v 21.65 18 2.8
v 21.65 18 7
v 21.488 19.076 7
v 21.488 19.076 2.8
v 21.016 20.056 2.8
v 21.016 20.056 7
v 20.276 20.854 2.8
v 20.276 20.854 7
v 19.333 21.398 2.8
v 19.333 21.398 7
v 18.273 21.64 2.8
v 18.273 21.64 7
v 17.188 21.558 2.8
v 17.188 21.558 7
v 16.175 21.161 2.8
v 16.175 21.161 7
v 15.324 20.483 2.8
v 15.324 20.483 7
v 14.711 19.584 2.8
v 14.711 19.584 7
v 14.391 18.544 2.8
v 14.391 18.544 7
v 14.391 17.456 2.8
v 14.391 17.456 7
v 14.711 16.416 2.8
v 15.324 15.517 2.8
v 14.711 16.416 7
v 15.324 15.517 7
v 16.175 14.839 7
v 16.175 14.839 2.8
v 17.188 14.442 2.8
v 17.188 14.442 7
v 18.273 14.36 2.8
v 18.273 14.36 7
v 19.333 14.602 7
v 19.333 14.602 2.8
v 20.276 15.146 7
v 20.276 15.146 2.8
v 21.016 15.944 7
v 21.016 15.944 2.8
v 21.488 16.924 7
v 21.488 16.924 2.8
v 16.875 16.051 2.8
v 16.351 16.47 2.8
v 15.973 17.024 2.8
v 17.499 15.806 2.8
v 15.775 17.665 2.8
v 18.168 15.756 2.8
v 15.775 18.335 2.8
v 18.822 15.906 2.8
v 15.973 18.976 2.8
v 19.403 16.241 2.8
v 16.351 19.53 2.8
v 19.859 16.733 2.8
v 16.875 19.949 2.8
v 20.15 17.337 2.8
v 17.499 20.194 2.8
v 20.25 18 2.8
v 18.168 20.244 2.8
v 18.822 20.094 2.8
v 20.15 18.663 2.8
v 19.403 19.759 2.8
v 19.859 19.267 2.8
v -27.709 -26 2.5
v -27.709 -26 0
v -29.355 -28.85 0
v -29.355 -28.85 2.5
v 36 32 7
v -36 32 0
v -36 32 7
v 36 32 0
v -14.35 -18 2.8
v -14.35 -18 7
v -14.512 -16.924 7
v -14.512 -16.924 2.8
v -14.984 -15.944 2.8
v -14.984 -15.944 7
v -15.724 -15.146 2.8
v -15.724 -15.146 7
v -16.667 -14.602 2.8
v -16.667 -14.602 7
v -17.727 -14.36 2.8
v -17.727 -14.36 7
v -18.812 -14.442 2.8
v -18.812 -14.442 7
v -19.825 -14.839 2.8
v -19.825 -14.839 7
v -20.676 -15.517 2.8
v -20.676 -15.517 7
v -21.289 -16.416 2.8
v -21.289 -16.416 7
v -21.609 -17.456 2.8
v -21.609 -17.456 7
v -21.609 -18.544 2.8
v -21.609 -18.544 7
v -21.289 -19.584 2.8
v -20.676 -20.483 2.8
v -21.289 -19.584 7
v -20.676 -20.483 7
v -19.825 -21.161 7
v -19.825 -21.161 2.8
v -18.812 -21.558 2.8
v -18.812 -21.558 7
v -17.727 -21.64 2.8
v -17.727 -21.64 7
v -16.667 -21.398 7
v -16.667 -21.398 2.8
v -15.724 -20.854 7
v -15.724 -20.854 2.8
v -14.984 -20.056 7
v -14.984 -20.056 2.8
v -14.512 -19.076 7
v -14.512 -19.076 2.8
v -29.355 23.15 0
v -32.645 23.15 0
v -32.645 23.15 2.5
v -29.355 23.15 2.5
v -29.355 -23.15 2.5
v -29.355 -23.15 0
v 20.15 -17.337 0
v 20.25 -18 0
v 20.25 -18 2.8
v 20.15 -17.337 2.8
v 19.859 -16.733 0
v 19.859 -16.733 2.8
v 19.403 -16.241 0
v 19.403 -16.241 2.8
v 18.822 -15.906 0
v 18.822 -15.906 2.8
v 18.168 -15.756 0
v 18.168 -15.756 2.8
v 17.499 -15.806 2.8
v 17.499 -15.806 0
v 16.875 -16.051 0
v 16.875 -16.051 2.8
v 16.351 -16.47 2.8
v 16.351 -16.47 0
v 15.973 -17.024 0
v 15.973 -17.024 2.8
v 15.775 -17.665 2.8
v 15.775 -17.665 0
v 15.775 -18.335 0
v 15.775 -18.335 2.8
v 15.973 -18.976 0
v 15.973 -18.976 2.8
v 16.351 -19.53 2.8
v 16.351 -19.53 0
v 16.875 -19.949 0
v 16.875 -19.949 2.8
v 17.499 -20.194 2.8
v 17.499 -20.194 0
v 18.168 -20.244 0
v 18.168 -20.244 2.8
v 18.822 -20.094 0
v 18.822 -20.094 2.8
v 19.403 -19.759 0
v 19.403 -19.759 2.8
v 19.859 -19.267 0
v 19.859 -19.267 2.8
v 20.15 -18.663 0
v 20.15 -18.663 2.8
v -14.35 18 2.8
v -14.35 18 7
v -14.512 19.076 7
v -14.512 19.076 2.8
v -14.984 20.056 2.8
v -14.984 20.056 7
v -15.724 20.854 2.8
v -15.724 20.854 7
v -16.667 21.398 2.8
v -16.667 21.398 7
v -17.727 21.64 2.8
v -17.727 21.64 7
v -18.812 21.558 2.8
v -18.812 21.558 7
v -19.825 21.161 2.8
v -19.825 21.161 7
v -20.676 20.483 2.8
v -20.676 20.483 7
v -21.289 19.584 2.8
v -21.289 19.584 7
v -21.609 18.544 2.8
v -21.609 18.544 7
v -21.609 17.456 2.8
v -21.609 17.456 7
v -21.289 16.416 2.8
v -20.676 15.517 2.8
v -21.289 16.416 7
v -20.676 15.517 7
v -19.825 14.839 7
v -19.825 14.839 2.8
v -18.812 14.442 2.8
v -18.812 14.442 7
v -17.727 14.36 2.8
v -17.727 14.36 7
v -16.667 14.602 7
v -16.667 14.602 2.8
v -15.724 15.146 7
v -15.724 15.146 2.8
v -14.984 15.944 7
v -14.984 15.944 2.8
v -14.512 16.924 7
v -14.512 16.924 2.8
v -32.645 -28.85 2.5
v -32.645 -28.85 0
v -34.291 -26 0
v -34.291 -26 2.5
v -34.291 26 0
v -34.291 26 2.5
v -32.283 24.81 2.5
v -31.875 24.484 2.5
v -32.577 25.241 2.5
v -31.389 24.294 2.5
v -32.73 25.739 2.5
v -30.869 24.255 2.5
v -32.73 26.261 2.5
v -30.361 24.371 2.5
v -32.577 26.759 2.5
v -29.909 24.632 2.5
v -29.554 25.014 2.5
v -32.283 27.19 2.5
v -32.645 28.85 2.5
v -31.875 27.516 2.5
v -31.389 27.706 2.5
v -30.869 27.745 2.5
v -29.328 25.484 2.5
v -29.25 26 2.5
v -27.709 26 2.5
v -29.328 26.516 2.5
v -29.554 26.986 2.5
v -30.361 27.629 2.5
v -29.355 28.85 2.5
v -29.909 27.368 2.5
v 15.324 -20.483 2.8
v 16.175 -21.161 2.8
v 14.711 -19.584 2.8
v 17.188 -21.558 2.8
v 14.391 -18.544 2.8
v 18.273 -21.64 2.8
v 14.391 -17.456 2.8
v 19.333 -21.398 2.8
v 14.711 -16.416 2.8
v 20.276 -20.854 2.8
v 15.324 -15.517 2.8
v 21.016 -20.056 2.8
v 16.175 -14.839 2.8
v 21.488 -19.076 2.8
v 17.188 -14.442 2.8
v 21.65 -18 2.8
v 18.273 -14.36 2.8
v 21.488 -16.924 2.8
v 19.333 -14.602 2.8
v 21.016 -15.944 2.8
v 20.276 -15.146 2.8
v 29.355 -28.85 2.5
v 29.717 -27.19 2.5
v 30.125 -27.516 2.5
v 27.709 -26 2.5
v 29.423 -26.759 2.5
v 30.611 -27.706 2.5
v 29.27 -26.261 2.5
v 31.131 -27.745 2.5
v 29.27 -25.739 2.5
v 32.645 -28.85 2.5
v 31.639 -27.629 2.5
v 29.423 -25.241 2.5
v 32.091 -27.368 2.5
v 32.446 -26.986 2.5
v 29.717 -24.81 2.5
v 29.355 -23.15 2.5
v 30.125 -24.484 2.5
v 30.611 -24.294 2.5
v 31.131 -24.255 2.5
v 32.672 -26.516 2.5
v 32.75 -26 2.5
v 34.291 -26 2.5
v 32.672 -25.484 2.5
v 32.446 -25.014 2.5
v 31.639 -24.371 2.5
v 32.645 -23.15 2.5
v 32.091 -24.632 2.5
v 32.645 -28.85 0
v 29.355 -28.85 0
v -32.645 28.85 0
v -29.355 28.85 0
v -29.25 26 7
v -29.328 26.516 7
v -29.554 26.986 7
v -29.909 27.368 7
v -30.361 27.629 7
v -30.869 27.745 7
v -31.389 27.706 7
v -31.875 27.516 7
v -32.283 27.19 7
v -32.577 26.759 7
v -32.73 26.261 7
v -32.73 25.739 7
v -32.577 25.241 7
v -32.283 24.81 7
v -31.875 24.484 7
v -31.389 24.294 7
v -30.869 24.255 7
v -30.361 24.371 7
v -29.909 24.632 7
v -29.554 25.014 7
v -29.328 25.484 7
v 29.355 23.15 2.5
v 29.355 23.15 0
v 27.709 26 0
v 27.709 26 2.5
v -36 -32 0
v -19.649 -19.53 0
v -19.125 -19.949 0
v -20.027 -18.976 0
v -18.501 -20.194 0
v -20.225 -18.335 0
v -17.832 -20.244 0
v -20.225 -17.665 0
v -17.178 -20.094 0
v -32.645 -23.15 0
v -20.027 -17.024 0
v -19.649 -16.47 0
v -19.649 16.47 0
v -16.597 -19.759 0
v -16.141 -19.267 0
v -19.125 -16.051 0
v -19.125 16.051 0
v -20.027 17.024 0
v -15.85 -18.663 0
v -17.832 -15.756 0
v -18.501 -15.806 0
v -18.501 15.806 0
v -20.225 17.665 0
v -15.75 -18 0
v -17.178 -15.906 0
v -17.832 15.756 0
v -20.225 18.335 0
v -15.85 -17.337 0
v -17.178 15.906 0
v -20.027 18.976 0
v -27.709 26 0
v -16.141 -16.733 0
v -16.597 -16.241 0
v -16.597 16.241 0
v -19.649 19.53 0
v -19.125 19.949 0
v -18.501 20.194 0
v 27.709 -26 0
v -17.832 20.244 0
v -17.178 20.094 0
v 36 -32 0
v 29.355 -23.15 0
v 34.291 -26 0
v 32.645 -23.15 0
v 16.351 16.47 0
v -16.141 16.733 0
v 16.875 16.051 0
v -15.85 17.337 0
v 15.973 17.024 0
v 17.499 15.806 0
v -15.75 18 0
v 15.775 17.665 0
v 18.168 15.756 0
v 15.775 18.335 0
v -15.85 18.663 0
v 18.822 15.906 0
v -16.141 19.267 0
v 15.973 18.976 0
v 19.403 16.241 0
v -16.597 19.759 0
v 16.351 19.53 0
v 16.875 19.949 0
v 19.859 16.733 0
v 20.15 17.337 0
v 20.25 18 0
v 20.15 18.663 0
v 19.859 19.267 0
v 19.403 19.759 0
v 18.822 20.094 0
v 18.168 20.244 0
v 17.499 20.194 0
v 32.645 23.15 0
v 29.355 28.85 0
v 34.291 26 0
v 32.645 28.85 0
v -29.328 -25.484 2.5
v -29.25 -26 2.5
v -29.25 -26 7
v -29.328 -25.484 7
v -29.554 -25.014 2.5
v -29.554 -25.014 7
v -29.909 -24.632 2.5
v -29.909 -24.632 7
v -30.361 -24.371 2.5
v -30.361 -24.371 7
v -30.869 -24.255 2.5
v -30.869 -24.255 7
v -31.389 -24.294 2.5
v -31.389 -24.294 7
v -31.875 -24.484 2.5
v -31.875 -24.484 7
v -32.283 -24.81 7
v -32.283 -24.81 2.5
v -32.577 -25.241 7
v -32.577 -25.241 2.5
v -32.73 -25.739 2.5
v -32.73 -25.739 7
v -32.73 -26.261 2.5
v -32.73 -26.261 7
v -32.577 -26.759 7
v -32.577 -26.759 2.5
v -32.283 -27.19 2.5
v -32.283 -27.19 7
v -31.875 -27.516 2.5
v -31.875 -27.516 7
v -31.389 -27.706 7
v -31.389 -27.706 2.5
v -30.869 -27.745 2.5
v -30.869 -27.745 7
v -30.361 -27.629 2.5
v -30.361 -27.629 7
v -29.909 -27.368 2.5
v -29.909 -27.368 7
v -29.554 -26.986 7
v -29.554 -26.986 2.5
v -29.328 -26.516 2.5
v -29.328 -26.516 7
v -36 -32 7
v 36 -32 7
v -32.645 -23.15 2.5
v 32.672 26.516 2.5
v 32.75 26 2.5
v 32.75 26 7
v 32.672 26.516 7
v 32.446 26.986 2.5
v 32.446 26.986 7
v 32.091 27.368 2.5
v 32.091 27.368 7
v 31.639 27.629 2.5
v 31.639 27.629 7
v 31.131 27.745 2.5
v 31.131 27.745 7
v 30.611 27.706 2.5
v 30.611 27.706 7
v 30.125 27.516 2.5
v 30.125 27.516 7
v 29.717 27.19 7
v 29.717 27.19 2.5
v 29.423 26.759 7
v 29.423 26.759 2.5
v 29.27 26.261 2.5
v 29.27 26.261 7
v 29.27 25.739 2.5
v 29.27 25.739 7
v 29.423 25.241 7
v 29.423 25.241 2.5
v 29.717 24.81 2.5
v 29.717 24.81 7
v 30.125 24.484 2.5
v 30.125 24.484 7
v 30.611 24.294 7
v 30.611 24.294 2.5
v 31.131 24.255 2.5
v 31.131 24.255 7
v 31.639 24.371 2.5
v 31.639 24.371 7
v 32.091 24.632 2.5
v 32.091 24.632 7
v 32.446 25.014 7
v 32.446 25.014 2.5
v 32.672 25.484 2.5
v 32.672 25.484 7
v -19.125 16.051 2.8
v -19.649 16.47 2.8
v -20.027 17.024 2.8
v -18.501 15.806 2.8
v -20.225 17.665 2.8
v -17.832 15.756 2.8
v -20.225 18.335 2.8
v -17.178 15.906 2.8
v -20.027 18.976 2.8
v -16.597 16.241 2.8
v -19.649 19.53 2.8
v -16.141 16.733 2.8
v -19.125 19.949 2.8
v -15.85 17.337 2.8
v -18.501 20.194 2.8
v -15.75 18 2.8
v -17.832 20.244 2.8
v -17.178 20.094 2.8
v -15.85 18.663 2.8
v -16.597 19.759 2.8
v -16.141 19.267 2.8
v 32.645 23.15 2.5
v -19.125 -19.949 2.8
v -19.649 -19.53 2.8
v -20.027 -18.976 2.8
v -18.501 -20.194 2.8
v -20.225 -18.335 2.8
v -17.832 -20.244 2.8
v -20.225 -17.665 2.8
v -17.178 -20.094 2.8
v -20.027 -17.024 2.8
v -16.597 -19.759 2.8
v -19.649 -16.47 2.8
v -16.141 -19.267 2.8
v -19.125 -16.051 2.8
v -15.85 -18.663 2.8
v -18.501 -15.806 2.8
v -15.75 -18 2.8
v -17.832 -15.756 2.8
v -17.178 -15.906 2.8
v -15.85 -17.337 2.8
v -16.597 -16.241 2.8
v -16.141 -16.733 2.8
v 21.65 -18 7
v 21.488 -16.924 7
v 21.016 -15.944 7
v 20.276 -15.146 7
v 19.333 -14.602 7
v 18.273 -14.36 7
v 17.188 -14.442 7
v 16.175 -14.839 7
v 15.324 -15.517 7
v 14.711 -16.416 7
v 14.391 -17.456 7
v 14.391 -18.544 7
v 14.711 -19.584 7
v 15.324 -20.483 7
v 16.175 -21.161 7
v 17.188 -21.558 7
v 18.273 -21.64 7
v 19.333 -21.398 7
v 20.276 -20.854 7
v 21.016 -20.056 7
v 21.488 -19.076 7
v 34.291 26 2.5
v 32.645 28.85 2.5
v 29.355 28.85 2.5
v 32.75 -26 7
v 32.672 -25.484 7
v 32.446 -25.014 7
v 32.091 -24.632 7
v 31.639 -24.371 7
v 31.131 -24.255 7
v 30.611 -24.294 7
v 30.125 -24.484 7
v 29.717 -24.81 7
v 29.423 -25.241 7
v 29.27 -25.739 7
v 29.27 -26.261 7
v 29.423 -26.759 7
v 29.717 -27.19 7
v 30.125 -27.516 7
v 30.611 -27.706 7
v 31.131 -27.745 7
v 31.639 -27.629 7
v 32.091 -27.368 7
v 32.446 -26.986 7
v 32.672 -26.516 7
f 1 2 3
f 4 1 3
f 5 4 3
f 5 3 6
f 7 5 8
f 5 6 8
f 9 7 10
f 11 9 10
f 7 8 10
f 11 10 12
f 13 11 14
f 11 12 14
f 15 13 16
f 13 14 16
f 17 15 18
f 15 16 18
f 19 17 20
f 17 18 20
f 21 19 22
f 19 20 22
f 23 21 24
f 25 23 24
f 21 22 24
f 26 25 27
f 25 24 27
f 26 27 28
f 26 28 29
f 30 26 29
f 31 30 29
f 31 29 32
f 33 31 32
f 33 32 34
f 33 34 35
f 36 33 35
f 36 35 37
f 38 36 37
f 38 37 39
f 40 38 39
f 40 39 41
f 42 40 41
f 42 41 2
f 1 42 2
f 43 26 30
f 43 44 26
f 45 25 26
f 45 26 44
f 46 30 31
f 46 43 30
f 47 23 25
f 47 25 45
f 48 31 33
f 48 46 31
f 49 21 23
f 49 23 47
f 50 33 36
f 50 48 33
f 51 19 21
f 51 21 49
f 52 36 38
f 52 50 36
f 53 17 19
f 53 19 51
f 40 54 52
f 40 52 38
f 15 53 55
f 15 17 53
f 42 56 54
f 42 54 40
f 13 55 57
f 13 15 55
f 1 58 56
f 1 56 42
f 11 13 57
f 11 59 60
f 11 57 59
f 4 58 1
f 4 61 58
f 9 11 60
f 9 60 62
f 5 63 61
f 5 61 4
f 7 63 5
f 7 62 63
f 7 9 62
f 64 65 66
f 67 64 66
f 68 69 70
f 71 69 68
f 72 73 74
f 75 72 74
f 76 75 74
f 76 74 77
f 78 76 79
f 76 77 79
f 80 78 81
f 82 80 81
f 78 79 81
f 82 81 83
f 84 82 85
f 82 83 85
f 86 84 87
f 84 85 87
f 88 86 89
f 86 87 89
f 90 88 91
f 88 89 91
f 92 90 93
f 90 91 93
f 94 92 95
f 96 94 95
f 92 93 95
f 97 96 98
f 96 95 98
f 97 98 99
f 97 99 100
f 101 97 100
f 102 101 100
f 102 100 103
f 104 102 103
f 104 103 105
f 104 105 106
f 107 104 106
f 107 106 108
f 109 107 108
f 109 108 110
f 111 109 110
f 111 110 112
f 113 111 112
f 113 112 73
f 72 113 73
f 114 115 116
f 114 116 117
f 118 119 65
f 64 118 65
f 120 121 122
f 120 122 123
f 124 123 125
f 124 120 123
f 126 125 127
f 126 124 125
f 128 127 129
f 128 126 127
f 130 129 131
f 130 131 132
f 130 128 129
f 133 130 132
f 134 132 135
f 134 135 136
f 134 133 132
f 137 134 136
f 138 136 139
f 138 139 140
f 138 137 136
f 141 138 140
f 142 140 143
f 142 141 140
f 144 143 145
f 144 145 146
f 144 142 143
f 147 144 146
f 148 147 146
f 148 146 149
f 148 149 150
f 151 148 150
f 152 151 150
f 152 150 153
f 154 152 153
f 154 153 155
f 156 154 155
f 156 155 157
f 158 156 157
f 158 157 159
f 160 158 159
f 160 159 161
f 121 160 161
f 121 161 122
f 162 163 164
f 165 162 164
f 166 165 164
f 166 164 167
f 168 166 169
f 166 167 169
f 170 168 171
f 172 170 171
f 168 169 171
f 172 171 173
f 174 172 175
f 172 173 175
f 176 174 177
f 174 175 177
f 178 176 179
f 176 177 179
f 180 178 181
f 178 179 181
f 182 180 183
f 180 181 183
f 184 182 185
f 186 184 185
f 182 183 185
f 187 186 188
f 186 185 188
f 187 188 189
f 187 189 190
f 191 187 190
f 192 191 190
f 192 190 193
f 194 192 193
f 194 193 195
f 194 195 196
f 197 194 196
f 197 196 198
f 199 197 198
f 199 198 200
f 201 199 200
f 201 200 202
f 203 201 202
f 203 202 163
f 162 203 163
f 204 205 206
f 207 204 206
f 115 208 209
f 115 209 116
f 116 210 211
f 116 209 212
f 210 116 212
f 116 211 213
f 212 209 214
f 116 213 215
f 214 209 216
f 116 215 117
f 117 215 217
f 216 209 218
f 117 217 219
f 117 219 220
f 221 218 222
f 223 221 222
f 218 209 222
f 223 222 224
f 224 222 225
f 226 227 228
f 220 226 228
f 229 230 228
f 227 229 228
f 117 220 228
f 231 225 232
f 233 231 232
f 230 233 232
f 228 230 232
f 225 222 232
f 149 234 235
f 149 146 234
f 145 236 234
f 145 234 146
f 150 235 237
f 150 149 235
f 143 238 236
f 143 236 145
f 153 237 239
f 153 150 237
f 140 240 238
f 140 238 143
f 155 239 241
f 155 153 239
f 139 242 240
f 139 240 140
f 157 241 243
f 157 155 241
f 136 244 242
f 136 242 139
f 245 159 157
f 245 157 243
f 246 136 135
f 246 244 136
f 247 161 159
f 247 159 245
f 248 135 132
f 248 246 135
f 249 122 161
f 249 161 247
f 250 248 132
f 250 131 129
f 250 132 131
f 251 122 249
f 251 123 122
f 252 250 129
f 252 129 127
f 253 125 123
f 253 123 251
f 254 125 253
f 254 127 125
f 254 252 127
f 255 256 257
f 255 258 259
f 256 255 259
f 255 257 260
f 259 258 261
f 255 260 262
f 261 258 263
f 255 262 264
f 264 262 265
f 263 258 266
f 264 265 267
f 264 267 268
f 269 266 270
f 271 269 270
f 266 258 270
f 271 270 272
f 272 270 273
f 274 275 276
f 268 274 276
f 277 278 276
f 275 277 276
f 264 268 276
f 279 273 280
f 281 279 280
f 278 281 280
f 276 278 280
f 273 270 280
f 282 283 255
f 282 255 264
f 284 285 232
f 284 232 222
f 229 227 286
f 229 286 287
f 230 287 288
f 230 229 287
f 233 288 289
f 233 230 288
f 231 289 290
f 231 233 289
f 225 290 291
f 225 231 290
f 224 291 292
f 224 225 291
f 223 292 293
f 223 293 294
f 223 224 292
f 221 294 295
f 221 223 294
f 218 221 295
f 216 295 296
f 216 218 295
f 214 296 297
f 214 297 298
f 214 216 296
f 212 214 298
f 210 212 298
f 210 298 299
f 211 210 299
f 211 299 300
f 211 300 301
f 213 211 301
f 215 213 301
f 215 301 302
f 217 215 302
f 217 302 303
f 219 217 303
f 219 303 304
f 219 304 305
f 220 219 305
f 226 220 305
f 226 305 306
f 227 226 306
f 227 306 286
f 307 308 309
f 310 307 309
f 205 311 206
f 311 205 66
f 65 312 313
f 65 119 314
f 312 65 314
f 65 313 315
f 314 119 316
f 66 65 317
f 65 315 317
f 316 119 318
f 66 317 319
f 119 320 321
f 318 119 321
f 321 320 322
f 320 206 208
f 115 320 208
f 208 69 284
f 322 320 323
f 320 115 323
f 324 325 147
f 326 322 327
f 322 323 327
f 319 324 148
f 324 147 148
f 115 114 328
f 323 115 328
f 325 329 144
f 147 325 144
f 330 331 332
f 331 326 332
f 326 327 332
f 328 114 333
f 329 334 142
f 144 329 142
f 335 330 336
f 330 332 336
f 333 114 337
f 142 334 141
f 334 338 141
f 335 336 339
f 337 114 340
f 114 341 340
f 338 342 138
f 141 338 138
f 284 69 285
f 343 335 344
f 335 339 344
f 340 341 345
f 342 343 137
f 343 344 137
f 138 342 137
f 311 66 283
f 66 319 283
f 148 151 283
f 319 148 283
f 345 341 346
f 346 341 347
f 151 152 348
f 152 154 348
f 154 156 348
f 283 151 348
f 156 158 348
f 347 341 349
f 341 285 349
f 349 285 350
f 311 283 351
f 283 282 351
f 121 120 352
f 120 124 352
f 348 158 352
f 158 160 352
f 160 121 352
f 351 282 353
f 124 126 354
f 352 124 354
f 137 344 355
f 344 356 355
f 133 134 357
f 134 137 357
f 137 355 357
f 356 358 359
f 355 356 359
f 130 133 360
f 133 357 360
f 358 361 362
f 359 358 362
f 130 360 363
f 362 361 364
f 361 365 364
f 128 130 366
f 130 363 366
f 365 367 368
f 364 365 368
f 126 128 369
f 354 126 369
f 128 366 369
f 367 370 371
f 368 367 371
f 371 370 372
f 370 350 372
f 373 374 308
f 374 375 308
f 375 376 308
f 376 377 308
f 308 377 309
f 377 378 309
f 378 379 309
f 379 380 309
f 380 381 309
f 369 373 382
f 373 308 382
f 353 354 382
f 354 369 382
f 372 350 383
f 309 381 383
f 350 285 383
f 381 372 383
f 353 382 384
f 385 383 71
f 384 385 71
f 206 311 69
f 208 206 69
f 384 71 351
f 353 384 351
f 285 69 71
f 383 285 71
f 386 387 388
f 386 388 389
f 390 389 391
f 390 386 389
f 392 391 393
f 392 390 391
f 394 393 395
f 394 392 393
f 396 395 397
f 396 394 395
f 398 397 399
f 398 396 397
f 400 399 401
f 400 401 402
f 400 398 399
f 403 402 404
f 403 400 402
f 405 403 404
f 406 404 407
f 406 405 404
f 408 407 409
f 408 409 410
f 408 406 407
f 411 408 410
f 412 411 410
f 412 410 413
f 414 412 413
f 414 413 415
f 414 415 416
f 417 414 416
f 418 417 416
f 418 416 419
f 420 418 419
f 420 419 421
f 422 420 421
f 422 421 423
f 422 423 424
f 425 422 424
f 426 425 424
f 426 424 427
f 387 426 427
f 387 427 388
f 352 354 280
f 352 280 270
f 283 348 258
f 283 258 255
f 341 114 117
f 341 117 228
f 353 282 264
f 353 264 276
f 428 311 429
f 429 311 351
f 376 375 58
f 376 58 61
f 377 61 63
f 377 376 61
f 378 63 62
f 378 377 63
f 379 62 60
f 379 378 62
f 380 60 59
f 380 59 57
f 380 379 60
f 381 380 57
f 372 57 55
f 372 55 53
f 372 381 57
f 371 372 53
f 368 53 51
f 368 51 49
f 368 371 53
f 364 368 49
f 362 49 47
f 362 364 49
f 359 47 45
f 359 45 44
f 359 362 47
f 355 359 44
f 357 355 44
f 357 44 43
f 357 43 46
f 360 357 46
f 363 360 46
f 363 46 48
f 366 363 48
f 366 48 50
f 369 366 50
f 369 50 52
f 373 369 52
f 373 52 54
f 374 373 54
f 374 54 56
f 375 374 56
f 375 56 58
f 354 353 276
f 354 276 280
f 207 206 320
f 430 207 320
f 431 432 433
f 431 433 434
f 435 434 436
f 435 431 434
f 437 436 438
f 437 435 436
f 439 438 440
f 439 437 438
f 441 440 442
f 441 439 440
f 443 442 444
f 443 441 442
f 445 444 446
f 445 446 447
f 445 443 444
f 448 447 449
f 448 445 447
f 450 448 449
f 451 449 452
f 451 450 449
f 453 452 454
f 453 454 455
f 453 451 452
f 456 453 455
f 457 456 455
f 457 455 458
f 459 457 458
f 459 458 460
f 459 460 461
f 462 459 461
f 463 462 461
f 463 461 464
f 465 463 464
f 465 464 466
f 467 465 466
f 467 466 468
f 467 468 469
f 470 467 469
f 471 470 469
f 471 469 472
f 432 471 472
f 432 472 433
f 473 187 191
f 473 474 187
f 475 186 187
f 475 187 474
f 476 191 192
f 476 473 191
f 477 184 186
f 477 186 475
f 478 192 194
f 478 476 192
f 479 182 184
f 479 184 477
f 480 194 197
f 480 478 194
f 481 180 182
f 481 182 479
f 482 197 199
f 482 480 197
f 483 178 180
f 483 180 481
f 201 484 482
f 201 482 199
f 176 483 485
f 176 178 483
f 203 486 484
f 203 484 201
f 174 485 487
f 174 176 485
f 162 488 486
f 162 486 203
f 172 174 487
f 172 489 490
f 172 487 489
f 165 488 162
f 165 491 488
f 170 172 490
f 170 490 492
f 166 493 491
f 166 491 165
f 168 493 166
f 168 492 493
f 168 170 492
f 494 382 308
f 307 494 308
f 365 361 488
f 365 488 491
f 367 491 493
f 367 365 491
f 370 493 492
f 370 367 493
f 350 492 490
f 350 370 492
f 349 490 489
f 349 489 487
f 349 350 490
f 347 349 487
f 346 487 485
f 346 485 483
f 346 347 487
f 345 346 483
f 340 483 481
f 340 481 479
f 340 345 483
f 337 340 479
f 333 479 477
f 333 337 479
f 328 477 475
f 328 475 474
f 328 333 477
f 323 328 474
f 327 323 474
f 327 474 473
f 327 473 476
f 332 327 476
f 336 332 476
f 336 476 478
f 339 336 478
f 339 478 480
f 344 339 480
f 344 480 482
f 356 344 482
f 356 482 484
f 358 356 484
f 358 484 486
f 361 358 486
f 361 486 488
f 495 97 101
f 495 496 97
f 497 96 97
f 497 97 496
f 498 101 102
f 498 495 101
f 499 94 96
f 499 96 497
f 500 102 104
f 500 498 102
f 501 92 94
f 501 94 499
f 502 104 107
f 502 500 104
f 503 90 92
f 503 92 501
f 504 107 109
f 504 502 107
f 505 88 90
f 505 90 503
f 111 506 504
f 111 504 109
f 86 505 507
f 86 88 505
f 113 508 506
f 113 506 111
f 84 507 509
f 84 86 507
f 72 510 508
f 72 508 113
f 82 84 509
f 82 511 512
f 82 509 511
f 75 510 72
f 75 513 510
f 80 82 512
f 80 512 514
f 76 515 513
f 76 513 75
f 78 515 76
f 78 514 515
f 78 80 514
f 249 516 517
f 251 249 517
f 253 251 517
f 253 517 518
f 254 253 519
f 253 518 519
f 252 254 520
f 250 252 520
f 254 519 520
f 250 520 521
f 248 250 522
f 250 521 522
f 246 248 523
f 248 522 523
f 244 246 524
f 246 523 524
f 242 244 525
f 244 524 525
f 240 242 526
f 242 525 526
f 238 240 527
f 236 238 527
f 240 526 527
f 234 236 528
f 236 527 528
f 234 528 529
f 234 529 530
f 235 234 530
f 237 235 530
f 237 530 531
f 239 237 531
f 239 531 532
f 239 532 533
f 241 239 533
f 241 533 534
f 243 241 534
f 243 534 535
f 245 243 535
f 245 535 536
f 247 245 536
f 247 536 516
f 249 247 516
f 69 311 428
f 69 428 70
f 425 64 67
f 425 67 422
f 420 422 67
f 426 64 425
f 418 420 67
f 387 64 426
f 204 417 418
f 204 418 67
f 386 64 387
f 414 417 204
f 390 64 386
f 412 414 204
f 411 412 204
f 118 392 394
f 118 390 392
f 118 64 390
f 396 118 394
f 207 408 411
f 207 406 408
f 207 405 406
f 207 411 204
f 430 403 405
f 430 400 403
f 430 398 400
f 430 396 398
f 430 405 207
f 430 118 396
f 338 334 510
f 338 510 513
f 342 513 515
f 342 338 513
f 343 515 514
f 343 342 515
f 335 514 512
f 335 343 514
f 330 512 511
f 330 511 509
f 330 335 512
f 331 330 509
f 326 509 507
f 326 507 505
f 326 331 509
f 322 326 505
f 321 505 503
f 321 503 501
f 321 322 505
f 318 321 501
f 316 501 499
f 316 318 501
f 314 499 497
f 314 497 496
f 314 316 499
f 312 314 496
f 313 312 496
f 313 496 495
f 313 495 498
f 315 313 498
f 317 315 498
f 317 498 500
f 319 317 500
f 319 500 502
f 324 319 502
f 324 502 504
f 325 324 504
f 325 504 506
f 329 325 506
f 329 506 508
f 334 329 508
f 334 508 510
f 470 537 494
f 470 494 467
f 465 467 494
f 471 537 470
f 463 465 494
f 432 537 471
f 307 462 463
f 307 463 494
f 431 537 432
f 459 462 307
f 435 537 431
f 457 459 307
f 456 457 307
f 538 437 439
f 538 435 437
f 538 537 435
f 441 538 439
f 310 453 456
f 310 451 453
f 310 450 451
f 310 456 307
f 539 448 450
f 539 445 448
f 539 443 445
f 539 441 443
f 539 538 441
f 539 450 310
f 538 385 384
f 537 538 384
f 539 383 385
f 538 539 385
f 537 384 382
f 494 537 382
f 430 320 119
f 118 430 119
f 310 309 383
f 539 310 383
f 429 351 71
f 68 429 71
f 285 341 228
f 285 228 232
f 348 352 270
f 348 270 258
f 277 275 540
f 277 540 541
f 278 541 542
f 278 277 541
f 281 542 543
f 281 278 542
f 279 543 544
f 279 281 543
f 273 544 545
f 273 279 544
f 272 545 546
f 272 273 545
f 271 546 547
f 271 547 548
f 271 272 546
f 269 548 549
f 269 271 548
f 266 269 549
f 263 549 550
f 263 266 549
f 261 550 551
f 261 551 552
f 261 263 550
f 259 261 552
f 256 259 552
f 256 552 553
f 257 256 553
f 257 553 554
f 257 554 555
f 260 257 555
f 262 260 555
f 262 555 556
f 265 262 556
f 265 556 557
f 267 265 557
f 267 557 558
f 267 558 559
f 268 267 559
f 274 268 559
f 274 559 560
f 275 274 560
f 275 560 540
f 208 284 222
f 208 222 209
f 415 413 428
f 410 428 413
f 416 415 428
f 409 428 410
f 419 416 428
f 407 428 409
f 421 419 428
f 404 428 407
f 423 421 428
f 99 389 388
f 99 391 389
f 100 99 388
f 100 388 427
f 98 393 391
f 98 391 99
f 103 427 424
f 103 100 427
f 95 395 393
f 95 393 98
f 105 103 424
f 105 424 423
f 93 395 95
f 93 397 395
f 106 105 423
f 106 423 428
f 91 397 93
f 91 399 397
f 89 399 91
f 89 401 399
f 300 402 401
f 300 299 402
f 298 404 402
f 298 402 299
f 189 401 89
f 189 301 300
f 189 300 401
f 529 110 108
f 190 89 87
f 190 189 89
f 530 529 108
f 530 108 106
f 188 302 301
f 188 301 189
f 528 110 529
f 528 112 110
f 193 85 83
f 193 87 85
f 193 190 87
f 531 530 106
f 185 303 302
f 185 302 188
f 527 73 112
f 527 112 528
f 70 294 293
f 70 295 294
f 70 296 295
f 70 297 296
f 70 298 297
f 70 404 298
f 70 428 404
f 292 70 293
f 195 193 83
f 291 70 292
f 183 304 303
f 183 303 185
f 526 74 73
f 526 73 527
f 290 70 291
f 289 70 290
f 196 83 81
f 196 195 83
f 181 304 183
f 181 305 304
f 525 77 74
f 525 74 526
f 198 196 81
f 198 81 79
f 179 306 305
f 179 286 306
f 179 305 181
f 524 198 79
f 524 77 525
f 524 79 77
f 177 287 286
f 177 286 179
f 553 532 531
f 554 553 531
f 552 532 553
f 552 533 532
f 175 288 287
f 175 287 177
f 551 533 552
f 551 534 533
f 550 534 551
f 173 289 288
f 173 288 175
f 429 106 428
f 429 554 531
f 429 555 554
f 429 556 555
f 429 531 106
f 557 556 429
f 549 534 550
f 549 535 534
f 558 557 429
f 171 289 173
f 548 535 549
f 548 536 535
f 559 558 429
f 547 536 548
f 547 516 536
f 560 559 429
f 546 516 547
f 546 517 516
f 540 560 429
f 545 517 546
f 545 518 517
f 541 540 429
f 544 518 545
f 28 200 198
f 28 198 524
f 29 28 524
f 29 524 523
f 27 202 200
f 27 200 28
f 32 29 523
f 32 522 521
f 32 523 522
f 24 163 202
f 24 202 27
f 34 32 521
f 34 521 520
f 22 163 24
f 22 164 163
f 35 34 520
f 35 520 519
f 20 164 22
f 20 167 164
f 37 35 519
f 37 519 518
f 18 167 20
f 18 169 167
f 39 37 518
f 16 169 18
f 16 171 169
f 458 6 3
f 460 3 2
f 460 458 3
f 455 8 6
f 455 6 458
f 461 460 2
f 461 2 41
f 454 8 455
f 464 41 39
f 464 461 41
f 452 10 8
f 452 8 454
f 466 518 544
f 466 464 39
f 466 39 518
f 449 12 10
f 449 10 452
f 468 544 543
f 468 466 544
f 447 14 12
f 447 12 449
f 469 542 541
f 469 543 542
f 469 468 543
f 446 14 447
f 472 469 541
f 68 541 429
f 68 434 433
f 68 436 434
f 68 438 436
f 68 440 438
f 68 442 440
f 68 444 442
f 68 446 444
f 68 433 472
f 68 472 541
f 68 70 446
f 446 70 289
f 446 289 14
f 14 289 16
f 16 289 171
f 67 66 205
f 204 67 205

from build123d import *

# Parameters (mm, degrees)
SKETCH_2_W                = 72
SKETCH_2_H                = 64
SKETCH_2_R                = 2.25
SKETCH_2_R_2              = 1.75
EXTRUDE_1_DEPTH           = 7
HOLE_WIZARD_1_D           = 4.5
HOLE_WIZARD_1_CBORE_D     = 7.3
HOLE_WIZARD_1_CBORE_DEPTH = 4.2
CUT_EXTRUDE_1_DEPTH       = 2.5


with BuildPart() as part:
    # 草圖2 → 填料-伸長1 (new body)
    with BuildSketch(Plane.XY):
        Rectangle(SKETCH_2_W, SKETCH_2_H)
        with Locations((-18, 18)):
            Circle(SKETCH_2_R, mode=Mode.SUBTRACT)
        with Locations((-31, 26)):
            Circle(SKETCH_2_R_2, mode=Mode.SUBTRACT)
        with Locations((18, 18)):
            Circle(SKETCH_2_R, mode=Mode.SUBTRACT)
        with Locations((18, -18)):
            Circle(SKETCH_2_R, mode=Mode.SUBTRACT)
        with Locations((-18, -18)):
            Circle(SKETCH_2_R, mode=Mode.SUBTRACT)
        with Locations((31, 26)):
            Circle(SKETCH_2_R_2, mode=Mode.SUBTRACT)
        with Locations((31, -26)):
            Circle(SKETCH_2_R_2, mode=Mode.SUBTRACT)
        with Locations((-31, -26)):
            Circle(SKETCH_2_R_2, mode=Mode.SUBTRACT)
    extrude(amount=EXTRUDE_1_DEPTH)

    # 鑽孔1 (through all)
    with Locations(Plane(origin=(-18, 18, 7), x_dir=(1, 0, 0), z_dir=(0, 0, 1))):
        with Locations((0, 0), (36, 0), (36, -36), (0, -36)):
            CounterBoreHole(HOLE_WIZARD_1_D / 2, HOLE_WIZARD_1_CBORE_D / 2, HOLE_WIZARD_1_CBORE_DEPTH)

    # 草圖4 → 除料-伸長1 (cut)
    with BuildSketch(Plane(origin=(0, 0, 0), x_dir=(-1, 0, 0), z_dir=(0, 0, -1))):
        Polygon((-27.709103466, 26), (-29.354551733, 28.85), (-32.645448267, 28.85), (-34.290896534, 26), (-32.645448267, 23.15), (-29.354551733, 23.15), align=None)
        Polygon((29.354551733, 23.15), (27.709103466, 26), (29.354551733, 28.85), (32.645448267, 28.85), (34.290896534, 26), (32.645448267, 23.15), align=None)
        Polygon((27.709103466, -26), (29.354551733, -28.85), (32.645448267, -28.85), (34.290896534, -26), (32.645448267, -23.15), (29.354551733, -23.15), align=None)
        Polygon((-29.354551733, -23.15), (-27.709103466, -26), (-29.354551733, -28.85), (-32.645448267, -28.85), (-34.290896534, -26), (-32.645448267, -23.15), align=None)
    extrude(amount=-CUT_EXTRUDE_1_DEPTH, mode=Mode.SUBTRACT)


solid = part.part
